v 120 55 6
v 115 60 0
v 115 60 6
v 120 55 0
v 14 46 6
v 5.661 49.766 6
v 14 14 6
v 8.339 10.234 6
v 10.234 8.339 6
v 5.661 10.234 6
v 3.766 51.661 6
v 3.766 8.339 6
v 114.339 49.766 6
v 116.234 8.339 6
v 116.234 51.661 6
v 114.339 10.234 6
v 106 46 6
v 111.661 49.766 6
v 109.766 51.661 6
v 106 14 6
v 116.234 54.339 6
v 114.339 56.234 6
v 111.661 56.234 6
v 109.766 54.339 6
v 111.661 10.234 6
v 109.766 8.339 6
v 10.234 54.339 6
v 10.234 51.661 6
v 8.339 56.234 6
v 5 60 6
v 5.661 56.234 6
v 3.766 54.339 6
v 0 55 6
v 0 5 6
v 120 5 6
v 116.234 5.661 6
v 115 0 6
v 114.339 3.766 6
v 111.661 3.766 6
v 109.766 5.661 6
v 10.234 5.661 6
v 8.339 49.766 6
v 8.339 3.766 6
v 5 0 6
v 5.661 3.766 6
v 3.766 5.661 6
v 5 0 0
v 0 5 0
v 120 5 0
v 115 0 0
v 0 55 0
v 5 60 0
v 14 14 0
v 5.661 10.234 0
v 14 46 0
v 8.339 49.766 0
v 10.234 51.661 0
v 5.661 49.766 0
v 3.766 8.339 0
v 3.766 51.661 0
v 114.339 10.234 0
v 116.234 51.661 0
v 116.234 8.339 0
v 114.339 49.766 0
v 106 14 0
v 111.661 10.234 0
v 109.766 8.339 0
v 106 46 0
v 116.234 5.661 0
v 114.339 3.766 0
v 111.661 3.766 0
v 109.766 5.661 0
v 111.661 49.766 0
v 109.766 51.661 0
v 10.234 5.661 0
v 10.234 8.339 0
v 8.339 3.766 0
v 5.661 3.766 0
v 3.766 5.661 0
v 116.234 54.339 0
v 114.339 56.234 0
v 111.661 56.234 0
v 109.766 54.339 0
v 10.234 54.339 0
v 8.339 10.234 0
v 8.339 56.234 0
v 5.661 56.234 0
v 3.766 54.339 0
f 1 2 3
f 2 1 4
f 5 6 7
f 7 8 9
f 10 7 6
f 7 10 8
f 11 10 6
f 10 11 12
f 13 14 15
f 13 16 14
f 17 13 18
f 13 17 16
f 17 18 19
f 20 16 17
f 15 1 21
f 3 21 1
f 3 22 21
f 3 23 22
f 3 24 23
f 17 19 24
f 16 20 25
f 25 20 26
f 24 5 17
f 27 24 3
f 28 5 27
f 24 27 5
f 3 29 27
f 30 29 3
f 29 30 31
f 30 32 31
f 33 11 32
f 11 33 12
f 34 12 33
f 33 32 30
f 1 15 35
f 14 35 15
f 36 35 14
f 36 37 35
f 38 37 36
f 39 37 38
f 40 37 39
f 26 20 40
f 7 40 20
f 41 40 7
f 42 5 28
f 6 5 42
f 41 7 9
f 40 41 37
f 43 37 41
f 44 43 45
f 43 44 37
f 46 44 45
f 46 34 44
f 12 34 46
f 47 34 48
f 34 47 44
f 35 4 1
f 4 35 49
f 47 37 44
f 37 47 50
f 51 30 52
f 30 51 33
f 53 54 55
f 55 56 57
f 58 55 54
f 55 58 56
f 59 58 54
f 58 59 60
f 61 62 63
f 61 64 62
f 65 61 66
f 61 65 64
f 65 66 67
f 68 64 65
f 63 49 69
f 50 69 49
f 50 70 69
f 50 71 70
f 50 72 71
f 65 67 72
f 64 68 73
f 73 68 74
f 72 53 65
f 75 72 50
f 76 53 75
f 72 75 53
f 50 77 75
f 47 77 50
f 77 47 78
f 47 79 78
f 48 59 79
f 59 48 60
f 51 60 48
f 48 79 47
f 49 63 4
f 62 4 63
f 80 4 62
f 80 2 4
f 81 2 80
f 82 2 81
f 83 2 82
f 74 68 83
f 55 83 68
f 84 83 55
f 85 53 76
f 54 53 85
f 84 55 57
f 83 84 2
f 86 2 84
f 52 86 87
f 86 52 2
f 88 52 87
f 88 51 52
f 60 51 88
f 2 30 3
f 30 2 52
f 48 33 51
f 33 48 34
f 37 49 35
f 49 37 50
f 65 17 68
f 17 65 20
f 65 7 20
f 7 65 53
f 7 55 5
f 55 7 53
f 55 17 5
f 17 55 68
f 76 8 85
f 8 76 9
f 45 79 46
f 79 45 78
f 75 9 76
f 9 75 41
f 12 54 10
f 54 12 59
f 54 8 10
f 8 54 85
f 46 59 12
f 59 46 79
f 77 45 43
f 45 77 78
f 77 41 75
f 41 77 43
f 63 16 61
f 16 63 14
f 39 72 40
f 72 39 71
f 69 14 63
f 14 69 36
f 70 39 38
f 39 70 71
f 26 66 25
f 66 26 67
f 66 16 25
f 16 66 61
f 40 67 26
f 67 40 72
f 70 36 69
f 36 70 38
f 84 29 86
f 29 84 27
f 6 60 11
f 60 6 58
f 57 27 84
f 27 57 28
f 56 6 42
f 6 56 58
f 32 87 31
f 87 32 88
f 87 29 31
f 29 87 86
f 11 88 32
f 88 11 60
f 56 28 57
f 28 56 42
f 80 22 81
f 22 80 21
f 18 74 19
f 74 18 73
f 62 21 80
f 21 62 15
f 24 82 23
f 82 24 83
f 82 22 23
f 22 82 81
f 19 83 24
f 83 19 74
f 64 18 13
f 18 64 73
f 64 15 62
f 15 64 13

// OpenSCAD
$fn = 32;

// ----------------------------------------------------------------------
// Frame plate: 120 x 60 frame, 14 mm rails
// ----------------------------------------------------------------------

// --- parameters (mm) ---
plate_l = 120;            // plate length, X
plate_w = 60;             // plate width, Y
plate_t = 6;              // plate thickness, Z (extrusion height)
corner_c = 5;             // corner chamfer
frame_bar = 14;           // frame rail width
bolt_r = 3.5;             // corner bolt window radius
bolt_inset = 7;           // bolt centre inset from the edges

win_l = plate_l - 2 * frame_bar;  // window length
win_w = plate_w - 2 * frame_bar;  // window width
bolt_d = 2 * bolt_r;  // corner hole diameter

profile = [[5, 0], [115, 0], [120, 5], [120, 55], [115, 60], [5, 60], [0, 55], [0, 5]];  // primary outline, 8 points, counter clockwise
void_1 = [[14, 14], [106, 14], [106, 46], [14, 46]];  // the window, 4 points
void_2 = [[10.234, 8.339], [8.339, 10.234], [5.661, 10.234], [3.766, 8.339], [3.766, 5.661], [5.661, 3.766], [8.339, 3.766], [10.234, 5.661]];  // corner bolt window, 8 points
void_3 = [[116.234, 8.339], [114.339, 10.234], [111.661, 10.234], [109.766, 8.339], [109.766, 5.661], [111.661, 3.766], [114.339, 3.766], [116.234, 5.661]];  // corner bolt window, 8 points
void_4 = [[10.234, 54.339], [8.339, 56.234], [5.661, 56.234], [3.766, 54.339], [3.766, 51.661], [5.661, 49.766], [8.339, 49.766], [10.234, 51.661]];  // corner bolt window, 8 points
void_5 = [[116.234, 54.339], [114.339, 56.234], [111.661, 56.234], [109.766, 54.339], [109.766, 51.661], [111.661, 49.766], [114.339, 49.766], [116.234, 51.661]];  // corner bolt window, 8 points

// --- the one profile operation ---
difference() {
  linear_extrude(height = plate_t) polygon(points = profile);
  translate([0, 0, -1])
    linear_extrude(height = plate_t + 2) polygon(points = void_1);
  translate([0, 0, -1])
    linear_extrude(height = plate_t + 2) polygon(points = void_2);
  translate([0, 0, -1])
    linear_extrude(height = plate_t + 2) polygon(points = void_3);
  translate([0, 0, -1])
    linear_extrude(height = plate_t + 2) polygon(points = void_4);
  translate([0, 0, -1])
    linear_extrude(height = plate_t + 2) polygon(points = void_5);
}
